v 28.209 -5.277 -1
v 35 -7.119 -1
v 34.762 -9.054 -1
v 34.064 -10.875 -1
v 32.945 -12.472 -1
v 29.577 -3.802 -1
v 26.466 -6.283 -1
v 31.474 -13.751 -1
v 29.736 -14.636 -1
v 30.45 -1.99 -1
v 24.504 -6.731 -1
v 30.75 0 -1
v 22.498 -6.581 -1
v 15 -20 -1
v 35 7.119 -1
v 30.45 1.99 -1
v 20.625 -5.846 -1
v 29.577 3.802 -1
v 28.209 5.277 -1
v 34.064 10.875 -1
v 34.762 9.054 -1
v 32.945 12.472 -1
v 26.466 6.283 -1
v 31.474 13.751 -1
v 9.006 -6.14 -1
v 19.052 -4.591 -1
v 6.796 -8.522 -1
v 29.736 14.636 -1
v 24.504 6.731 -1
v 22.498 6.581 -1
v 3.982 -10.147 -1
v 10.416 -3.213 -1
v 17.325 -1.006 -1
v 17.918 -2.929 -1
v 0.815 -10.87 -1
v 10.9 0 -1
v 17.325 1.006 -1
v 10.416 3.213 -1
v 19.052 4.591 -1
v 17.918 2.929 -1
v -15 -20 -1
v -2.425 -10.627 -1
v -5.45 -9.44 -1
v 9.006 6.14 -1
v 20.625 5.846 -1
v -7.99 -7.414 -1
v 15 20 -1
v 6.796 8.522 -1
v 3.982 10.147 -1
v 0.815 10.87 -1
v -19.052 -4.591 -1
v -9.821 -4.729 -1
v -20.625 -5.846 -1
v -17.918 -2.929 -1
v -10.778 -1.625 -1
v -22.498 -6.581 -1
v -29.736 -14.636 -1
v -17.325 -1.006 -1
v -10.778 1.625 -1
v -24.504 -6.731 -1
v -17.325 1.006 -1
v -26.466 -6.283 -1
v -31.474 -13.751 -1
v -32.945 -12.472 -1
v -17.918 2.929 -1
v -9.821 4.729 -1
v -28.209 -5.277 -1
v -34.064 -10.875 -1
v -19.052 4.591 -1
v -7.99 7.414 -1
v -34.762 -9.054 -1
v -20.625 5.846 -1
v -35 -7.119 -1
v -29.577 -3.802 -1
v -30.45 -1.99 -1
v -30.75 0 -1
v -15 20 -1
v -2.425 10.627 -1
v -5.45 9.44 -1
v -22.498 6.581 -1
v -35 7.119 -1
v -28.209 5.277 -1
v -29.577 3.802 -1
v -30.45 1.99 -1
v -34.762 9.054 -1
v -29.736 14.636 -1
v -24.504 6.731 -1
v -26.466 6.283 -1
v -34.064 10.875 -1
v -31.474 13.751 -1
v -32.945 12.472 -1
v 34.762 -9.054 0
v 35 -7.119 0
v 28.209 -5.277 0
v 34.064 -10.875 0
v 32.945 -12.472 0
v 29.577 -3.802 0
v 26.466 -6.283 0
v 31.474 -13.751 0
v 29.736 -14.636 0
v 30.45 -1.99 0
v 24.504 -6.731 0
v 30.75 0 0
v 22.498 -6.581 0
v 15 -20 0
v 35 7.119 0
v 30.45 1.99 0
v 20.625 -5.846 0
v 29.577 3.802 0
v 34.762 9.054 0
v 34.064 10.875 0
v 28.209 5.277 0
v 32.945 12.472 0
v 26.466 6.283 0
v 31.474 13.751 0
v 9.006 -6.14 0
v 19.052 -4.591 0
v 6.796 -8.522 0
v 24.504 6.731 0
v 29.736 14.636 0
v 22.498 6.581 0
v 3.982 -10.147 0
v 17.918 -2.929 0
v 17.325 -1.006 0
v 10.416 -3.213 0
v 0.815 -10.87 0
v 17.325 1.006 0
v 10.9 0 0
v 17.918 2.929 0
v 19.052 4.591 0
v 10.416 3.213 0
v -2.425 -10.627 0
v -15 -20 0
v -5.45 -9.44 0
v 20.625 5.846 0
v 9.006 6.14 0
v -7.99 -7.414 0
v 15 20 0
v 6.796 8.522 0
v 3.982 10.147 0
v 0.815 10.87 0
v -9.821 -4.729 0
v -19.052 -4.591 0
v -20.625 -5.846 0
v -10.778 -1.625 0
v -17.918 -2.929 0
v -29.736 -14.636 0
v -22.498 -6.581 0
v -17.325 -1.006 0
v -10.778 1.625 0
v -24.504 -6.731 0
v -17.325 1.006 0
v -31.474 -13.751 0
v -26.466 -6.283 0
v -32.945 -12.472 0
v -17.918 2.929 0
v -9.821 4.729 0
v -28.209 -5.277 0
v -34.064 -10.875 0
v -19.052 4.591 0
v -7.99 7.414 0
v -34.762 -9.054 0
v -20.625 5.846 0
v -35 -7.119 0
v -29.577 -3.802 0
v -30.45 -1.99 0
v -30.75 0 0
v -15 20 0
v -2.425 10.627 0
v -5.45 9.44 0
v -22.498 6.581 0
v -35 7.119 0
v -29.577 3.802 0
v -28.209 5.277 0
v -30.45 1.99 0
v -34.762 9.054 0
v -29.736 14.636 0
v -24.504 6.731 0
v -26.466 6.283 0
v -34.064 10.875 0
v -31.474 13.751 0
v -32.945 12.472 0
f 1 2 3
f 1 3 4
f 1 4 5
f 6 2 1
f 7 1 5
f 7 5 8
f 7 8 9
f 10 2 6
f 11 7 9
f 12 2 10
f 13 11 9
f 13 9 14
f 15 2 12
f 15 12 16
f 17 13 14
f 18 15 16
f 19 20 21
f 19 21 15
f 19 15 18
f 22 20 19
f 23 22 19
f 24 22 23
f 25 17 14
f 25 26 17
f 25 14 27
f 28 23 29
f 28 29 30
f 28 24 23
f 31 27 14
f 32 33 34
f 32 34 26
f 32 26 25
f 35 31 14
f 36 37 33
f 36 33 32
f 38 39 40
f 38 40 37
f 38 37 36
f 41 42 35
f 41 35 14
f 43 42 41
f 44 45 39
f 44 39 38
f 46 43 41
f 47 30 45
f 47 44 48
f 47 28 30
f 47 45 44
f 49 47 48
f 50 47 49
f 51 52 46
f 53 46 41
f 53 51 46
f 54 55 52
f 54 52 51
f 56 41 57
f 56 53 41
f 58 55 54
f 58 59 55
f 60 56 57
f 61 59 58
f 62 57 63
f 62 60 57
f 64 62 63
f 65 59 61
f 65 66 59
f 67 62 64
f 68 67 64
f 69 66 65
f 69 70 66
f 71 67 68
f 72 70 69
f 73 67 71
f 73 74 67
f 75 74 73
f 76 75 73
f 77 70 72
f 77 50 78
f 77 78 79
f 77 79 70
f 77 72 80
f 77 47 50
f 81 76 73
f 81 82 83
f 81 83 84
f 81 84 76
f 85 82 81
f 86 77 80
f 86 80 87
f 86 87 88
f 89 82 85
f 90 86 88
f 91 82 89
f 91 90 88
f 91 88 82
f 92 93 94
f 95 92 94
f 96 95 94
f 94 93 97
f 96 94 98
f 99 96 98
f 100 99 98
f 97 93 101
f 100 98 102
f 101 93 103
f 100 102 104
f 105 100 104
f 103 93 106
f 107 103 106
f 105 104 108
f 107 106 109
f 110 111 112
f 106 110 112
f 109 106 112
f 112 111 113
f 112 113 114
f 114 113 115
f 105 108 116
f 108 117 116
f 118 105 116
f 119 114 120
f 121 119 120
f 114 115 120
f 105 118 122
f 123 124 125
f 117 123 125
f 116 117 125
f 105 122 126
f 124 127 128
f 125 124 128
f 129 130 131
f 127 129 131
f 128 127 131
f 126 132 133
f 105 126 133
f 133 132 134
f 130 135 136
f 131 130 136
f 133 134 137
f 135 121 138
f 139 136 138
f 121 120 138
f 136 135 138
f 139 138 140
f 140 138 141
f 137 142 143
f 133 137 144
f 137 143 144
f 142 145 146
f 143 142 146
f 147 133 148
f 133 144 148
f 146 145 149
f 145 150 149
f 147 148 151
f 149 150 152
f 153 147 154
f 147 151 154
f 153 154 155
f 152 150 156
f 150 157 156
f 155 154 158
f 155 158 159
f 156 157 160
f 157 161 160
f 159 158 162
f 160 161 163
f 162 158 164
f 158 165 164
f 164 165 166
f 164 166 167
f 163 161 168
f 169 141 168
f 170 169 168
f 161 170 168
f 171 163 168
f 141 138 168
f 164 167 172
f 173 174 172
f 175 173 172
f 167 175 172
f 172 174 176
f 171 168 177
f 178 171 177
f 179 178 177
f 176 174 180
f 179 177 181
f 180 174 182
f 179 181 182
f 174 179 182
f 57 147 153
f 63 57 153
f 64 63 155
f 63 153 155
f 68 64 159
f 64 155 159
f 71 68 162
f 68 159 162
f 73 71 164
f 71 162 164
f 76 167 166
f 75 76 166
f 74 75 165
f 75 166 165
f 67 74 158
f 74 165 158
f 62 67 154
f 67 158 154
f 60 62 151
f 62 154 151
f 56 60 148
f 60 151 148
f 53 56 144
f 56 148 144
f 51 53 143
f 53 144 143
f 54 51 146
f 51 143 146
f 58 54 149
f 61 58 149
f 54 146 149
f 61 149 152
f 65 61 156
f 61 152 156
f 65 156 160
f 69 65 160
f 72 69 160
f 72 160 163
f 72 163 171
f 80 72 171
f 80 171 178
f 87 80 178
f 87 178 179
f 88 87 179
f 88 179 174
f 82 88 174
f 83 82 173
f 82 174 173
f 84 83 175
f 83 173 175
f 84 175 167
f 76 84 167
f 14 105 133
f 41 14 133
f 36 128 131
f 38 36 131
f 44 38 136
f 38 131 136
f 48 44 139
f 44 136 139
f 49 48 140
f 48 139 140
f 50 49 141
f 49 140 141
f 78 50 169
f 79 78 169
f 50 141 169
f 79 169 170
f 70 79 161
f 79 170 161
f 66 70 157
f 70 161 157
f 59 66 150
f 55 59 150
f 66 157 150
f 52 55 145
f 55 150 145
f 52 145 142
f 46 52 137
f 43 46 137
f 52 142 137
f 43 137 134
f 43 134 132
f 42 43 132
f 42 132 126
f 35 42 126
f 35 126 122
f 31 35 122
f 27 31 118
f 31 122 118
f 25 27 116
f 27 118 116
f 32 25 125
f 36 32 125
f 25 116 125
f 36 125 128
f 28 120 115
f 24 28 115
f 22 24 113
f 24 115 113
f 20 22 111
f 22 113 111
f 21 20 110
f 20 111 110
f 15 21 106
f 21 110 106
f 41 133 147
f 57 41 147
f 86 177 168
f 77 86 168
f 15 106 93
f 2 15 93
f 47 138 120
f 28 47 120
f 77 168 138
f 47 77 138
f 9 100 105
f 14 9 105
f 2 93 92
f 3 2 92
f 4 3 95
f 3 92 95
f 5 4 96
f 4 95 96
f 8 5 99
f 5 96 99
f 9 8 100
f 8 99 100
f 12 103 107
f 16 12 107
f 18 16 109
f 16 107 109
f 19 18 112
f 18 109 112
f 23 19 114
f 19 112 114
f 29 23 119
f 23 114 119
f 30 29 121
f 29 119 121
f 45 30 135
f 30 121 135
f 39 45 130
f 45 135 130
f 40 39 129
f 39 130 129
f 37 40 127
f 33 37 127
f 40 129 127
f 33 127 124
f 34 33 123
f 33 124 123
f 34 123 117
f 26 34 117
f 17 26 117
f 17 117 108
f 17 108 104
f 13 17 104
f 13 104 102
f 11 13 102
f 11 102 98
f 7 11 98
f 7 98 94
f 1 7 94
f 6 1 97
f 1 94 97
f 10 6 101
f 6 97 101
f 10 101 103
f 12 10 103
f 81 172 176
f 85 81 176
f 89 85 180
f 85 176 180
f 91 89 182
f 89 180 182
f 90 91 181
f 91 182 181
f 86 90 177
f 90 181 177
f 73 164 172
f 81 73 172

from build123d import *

# Parameters (mm, degrees)
SKETCH1_R           = 10.9
SKETCH1_R_2         = 6.75
BOSS_EXTRUDE1_DEPTH = 1


with BuildPart() as part:
    # Sketch1 → Boss-Extrude1 (new body)
    with BuildSketch(Plane.XY):
        with BuildLine():
            Line((-15, 20), (15, 20))
            Line((15, 20), (29.736161147, 14.636475975))
            ThreePointArc((29.736161147, 14.636475975), (33.553216354, 11.7075465), (35, 7.118935009))
            Line((35, 7.118935009), (35, -7.118935009))
            ThreePointArc((35, -7.118935009), (33.553216354, -11.7075465), (29.736161147, -14.636475975))
            Line((29.736161147, -14.636475975), (15, -20))
            Line((15, -20), (-15, -20))
            Line((-15, -20), (-29.736161147, -14.636475975))
            ThreePointArc((-29.736161147, -14.636475975), (-33.553216354, -11.7075465), (-35, -7.118935009))
            Line((-35, -7.118935009), (-35, 7.118935009))
            ThreePointArc((-35, 7.118935009), (-33.553216354, 11.7075465), (-29.736161147, 14.636475975))
            Line((-29.736161147, 14.636475975), (-15, 20))
        make_face()
        Circle(SKETCH1_R, mode=Mode.SUBTRACT)
        with Locations((24, 0)):
            Circle(SKETCH1_R_2, mode=Mode.SUBTRACT)
        with Locations(Location((-24, 0, 0), (0, 0, 180))):
            Circle(SKETCH1_R_2, mode=Mode.SUBTRACT)
    extrude(amount=-BOSS_EXTRUDE1_DEPTH)


solid = part.part
